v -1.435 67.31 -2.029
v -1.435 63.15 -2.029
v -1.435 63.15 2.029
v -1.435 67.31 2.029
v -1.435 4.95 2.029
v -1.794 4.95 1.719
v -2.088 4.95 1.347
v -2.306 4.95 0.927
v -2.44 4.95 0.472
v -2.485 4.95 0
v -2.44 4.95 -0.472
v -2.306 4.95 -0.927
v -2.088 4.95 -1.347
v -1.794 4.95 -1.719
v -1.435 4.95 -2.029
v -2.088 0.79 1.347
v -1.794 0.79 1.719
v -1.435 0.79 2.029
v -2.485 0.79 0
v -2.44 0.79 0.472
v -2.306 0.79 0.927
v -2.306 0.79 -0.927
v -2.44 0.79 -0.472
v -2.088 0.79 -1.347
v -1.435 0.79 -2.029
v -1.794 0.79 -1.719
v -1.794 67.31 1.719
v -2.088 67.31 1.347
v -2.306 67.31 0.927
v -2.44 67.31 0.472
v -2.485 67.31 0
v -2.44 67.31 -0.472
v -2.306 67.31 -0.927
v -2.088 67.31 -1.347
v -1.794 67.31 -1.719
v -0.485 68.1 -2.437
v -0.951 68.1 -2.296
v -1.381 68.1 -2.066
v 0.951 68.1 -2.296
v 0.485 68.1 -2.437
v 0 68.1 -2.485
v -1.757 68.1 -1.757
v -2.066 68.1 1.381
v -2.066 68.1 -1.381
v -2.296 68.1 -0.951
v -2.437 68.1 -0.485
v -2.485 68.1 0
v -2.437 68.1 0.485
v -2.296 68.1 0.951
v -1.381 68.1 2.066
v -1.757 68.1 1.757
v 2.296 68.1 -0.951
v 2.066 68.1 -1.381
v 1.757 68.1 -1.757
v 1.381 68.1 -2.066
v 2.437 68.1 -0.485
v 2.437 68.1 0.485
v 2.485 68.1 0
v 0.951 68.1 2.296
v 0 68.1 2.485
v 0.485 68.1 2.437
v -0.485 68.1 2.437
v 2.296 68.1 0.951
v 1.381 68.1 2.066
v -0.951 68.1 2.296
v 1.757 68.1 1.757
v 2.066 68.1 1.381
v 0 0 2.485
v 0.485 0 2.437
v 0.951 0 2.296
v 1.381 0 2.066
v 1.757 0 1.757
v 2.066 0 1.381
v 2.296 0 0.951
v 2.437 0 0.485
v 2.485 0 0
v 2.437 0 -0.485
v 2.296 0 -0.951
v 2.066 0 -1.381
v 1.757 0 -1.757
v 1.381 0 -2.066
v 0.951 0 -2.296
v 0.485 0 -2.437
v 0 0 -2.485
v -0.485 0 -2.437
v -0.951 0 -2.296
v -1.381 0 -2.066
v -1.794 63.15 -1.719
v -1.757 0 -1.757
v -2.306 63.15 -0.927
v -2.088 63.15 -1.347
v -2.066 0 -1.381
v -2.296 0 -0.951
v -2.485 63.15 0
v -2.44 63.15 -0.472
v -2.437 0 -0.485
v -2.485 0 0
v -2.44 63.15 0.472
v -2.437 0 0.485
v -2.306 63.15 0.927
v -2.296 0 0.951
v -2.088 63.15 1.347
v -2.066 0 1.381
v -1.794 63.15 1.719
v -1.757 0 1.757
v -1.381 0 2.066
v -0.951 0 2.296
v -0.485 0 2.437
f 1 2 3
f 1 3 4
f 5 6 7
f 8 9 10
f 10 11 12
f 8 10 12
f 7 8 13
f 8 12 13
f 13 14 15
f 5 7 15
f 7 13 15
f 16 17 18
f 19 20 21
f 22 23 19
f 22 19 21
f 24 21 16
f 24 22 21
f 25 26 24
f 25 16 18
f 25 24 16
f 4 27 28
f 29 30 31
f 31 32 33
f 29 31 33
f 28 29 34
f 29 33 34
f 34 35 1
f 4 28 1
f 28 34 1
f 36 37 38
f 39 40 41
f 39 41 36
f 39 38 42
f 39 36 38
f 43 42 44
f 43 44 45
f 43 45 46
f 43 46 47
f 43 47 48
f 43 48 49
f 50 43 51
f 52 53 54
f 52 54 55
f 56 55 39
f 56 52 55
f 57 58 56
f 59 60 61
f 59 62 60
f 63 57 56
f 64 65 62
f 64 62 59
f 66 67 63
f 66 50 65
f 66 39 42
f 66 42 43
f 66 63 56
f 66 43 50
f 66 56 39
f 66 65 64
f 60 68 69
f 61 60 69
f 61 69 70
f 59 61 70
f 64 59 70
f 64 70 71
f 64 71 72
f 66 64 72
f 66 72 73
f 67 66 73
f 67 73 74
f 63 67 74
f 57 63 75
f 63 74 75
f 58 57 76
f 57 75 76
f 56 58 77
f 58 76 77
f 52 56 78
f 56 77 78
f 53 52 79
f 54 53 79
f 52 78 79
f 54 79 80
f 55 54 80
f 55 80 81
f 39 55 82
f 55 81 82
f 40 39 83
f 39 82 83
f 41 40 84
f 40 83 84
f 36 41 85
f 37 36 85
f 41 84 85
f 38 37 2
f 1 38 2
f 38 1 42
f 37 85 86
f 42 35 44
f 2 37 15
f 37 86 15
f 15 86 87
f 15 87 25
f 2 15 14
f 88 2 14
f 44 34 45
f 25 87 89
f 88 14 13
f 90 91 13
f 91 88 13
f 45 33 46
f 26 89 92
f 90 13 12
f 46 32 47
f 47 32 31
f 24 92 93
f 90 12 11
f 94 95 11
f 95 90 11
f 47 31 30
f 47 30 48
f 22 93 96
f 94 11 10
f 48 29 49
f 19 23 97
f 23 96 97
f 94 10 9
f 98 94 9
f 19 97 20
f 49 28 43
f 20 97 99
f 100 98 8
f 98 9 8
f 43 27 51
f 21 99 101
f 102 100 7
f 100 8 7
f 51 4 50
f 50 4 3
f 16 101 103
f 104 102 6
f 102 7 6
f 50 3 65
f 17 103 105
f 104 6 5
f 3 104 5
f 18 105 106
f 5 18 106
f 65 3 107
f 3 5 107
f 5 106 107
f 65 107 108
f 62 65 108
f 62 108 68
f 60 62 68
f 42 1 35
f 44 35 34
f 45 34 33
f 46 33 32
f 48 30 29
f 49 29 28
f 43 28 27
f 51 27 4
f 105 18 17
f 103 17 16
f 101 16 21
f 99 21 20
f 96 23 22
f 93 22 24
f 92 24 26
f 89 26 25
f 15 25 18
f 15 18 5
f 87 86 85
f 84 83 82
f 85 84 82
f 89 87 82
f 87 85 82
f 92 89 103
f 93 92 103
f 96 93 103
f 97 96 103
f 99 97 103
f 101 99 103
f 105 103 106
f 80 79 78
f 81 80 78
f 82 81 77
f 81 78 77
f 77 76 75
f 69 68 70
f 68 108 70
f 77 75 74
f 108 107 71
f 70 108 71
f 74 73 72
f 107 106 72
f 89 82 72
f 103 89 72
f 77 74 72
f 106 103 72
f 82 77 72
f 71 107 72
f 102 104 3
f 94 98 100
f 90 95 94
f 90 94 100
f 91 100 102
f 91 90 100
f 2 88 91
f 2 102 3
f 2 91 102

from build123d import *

# Parameters (mm, degrees)
SCHIZZO2_R                    = 2.485
ESTRUSIONE_ESTRUSIONE1_DEPTH  = 68.1
TAGLIO_ESTRUSIONE1_DEPTH      = 69.19061849
TAGLIO_ESTRUSIONE1_DEPTH_BACK = 69.19061849
SCHIZZO3_W                    = 1.05
SCHIZZO3_H                    = 4.16


with BuildPart() as part:
    # Schizzo2 → Estrusione-Estrusione1 (new body)
    with BuildSketch(Plane(origin=(0, 0, 0), x_dir=(1, 0, 0), z_dir=(0, 1, 0))):
        with Locations(Location((0, 0, 0), (0, 0, 270))):
            Circle(SCHIZZO2_R)
    extrude(amount=ESTRUSIONE_ESTRUSIONE1_DEPTH)

    # Schizzo3 → Taglio-Estrusione1 (cut, two sides: drawn at the far end of the back side and taken through both)
    with BuildSketch(Plane.XY.offset(-TAGLIO_ESTRUSIONE1_DEPTH_BACK)):
        with Locations((-1.96, 65.23)):
            Rectangle(SCHIZZO3_W, SCHIZZO3_H)
        with Locations((-1.96, 2.87)):
            Rectangle(SCHIZZO3_W, SCHIZZO3_H)
    extrude(amount=TAGLIO_ESTRUSIONE1_DEPTH + TAGLIO_ESTRUSIONE1_DEPTH_BACK, mode=Mode.SUBTRACT)


solid = part.part
